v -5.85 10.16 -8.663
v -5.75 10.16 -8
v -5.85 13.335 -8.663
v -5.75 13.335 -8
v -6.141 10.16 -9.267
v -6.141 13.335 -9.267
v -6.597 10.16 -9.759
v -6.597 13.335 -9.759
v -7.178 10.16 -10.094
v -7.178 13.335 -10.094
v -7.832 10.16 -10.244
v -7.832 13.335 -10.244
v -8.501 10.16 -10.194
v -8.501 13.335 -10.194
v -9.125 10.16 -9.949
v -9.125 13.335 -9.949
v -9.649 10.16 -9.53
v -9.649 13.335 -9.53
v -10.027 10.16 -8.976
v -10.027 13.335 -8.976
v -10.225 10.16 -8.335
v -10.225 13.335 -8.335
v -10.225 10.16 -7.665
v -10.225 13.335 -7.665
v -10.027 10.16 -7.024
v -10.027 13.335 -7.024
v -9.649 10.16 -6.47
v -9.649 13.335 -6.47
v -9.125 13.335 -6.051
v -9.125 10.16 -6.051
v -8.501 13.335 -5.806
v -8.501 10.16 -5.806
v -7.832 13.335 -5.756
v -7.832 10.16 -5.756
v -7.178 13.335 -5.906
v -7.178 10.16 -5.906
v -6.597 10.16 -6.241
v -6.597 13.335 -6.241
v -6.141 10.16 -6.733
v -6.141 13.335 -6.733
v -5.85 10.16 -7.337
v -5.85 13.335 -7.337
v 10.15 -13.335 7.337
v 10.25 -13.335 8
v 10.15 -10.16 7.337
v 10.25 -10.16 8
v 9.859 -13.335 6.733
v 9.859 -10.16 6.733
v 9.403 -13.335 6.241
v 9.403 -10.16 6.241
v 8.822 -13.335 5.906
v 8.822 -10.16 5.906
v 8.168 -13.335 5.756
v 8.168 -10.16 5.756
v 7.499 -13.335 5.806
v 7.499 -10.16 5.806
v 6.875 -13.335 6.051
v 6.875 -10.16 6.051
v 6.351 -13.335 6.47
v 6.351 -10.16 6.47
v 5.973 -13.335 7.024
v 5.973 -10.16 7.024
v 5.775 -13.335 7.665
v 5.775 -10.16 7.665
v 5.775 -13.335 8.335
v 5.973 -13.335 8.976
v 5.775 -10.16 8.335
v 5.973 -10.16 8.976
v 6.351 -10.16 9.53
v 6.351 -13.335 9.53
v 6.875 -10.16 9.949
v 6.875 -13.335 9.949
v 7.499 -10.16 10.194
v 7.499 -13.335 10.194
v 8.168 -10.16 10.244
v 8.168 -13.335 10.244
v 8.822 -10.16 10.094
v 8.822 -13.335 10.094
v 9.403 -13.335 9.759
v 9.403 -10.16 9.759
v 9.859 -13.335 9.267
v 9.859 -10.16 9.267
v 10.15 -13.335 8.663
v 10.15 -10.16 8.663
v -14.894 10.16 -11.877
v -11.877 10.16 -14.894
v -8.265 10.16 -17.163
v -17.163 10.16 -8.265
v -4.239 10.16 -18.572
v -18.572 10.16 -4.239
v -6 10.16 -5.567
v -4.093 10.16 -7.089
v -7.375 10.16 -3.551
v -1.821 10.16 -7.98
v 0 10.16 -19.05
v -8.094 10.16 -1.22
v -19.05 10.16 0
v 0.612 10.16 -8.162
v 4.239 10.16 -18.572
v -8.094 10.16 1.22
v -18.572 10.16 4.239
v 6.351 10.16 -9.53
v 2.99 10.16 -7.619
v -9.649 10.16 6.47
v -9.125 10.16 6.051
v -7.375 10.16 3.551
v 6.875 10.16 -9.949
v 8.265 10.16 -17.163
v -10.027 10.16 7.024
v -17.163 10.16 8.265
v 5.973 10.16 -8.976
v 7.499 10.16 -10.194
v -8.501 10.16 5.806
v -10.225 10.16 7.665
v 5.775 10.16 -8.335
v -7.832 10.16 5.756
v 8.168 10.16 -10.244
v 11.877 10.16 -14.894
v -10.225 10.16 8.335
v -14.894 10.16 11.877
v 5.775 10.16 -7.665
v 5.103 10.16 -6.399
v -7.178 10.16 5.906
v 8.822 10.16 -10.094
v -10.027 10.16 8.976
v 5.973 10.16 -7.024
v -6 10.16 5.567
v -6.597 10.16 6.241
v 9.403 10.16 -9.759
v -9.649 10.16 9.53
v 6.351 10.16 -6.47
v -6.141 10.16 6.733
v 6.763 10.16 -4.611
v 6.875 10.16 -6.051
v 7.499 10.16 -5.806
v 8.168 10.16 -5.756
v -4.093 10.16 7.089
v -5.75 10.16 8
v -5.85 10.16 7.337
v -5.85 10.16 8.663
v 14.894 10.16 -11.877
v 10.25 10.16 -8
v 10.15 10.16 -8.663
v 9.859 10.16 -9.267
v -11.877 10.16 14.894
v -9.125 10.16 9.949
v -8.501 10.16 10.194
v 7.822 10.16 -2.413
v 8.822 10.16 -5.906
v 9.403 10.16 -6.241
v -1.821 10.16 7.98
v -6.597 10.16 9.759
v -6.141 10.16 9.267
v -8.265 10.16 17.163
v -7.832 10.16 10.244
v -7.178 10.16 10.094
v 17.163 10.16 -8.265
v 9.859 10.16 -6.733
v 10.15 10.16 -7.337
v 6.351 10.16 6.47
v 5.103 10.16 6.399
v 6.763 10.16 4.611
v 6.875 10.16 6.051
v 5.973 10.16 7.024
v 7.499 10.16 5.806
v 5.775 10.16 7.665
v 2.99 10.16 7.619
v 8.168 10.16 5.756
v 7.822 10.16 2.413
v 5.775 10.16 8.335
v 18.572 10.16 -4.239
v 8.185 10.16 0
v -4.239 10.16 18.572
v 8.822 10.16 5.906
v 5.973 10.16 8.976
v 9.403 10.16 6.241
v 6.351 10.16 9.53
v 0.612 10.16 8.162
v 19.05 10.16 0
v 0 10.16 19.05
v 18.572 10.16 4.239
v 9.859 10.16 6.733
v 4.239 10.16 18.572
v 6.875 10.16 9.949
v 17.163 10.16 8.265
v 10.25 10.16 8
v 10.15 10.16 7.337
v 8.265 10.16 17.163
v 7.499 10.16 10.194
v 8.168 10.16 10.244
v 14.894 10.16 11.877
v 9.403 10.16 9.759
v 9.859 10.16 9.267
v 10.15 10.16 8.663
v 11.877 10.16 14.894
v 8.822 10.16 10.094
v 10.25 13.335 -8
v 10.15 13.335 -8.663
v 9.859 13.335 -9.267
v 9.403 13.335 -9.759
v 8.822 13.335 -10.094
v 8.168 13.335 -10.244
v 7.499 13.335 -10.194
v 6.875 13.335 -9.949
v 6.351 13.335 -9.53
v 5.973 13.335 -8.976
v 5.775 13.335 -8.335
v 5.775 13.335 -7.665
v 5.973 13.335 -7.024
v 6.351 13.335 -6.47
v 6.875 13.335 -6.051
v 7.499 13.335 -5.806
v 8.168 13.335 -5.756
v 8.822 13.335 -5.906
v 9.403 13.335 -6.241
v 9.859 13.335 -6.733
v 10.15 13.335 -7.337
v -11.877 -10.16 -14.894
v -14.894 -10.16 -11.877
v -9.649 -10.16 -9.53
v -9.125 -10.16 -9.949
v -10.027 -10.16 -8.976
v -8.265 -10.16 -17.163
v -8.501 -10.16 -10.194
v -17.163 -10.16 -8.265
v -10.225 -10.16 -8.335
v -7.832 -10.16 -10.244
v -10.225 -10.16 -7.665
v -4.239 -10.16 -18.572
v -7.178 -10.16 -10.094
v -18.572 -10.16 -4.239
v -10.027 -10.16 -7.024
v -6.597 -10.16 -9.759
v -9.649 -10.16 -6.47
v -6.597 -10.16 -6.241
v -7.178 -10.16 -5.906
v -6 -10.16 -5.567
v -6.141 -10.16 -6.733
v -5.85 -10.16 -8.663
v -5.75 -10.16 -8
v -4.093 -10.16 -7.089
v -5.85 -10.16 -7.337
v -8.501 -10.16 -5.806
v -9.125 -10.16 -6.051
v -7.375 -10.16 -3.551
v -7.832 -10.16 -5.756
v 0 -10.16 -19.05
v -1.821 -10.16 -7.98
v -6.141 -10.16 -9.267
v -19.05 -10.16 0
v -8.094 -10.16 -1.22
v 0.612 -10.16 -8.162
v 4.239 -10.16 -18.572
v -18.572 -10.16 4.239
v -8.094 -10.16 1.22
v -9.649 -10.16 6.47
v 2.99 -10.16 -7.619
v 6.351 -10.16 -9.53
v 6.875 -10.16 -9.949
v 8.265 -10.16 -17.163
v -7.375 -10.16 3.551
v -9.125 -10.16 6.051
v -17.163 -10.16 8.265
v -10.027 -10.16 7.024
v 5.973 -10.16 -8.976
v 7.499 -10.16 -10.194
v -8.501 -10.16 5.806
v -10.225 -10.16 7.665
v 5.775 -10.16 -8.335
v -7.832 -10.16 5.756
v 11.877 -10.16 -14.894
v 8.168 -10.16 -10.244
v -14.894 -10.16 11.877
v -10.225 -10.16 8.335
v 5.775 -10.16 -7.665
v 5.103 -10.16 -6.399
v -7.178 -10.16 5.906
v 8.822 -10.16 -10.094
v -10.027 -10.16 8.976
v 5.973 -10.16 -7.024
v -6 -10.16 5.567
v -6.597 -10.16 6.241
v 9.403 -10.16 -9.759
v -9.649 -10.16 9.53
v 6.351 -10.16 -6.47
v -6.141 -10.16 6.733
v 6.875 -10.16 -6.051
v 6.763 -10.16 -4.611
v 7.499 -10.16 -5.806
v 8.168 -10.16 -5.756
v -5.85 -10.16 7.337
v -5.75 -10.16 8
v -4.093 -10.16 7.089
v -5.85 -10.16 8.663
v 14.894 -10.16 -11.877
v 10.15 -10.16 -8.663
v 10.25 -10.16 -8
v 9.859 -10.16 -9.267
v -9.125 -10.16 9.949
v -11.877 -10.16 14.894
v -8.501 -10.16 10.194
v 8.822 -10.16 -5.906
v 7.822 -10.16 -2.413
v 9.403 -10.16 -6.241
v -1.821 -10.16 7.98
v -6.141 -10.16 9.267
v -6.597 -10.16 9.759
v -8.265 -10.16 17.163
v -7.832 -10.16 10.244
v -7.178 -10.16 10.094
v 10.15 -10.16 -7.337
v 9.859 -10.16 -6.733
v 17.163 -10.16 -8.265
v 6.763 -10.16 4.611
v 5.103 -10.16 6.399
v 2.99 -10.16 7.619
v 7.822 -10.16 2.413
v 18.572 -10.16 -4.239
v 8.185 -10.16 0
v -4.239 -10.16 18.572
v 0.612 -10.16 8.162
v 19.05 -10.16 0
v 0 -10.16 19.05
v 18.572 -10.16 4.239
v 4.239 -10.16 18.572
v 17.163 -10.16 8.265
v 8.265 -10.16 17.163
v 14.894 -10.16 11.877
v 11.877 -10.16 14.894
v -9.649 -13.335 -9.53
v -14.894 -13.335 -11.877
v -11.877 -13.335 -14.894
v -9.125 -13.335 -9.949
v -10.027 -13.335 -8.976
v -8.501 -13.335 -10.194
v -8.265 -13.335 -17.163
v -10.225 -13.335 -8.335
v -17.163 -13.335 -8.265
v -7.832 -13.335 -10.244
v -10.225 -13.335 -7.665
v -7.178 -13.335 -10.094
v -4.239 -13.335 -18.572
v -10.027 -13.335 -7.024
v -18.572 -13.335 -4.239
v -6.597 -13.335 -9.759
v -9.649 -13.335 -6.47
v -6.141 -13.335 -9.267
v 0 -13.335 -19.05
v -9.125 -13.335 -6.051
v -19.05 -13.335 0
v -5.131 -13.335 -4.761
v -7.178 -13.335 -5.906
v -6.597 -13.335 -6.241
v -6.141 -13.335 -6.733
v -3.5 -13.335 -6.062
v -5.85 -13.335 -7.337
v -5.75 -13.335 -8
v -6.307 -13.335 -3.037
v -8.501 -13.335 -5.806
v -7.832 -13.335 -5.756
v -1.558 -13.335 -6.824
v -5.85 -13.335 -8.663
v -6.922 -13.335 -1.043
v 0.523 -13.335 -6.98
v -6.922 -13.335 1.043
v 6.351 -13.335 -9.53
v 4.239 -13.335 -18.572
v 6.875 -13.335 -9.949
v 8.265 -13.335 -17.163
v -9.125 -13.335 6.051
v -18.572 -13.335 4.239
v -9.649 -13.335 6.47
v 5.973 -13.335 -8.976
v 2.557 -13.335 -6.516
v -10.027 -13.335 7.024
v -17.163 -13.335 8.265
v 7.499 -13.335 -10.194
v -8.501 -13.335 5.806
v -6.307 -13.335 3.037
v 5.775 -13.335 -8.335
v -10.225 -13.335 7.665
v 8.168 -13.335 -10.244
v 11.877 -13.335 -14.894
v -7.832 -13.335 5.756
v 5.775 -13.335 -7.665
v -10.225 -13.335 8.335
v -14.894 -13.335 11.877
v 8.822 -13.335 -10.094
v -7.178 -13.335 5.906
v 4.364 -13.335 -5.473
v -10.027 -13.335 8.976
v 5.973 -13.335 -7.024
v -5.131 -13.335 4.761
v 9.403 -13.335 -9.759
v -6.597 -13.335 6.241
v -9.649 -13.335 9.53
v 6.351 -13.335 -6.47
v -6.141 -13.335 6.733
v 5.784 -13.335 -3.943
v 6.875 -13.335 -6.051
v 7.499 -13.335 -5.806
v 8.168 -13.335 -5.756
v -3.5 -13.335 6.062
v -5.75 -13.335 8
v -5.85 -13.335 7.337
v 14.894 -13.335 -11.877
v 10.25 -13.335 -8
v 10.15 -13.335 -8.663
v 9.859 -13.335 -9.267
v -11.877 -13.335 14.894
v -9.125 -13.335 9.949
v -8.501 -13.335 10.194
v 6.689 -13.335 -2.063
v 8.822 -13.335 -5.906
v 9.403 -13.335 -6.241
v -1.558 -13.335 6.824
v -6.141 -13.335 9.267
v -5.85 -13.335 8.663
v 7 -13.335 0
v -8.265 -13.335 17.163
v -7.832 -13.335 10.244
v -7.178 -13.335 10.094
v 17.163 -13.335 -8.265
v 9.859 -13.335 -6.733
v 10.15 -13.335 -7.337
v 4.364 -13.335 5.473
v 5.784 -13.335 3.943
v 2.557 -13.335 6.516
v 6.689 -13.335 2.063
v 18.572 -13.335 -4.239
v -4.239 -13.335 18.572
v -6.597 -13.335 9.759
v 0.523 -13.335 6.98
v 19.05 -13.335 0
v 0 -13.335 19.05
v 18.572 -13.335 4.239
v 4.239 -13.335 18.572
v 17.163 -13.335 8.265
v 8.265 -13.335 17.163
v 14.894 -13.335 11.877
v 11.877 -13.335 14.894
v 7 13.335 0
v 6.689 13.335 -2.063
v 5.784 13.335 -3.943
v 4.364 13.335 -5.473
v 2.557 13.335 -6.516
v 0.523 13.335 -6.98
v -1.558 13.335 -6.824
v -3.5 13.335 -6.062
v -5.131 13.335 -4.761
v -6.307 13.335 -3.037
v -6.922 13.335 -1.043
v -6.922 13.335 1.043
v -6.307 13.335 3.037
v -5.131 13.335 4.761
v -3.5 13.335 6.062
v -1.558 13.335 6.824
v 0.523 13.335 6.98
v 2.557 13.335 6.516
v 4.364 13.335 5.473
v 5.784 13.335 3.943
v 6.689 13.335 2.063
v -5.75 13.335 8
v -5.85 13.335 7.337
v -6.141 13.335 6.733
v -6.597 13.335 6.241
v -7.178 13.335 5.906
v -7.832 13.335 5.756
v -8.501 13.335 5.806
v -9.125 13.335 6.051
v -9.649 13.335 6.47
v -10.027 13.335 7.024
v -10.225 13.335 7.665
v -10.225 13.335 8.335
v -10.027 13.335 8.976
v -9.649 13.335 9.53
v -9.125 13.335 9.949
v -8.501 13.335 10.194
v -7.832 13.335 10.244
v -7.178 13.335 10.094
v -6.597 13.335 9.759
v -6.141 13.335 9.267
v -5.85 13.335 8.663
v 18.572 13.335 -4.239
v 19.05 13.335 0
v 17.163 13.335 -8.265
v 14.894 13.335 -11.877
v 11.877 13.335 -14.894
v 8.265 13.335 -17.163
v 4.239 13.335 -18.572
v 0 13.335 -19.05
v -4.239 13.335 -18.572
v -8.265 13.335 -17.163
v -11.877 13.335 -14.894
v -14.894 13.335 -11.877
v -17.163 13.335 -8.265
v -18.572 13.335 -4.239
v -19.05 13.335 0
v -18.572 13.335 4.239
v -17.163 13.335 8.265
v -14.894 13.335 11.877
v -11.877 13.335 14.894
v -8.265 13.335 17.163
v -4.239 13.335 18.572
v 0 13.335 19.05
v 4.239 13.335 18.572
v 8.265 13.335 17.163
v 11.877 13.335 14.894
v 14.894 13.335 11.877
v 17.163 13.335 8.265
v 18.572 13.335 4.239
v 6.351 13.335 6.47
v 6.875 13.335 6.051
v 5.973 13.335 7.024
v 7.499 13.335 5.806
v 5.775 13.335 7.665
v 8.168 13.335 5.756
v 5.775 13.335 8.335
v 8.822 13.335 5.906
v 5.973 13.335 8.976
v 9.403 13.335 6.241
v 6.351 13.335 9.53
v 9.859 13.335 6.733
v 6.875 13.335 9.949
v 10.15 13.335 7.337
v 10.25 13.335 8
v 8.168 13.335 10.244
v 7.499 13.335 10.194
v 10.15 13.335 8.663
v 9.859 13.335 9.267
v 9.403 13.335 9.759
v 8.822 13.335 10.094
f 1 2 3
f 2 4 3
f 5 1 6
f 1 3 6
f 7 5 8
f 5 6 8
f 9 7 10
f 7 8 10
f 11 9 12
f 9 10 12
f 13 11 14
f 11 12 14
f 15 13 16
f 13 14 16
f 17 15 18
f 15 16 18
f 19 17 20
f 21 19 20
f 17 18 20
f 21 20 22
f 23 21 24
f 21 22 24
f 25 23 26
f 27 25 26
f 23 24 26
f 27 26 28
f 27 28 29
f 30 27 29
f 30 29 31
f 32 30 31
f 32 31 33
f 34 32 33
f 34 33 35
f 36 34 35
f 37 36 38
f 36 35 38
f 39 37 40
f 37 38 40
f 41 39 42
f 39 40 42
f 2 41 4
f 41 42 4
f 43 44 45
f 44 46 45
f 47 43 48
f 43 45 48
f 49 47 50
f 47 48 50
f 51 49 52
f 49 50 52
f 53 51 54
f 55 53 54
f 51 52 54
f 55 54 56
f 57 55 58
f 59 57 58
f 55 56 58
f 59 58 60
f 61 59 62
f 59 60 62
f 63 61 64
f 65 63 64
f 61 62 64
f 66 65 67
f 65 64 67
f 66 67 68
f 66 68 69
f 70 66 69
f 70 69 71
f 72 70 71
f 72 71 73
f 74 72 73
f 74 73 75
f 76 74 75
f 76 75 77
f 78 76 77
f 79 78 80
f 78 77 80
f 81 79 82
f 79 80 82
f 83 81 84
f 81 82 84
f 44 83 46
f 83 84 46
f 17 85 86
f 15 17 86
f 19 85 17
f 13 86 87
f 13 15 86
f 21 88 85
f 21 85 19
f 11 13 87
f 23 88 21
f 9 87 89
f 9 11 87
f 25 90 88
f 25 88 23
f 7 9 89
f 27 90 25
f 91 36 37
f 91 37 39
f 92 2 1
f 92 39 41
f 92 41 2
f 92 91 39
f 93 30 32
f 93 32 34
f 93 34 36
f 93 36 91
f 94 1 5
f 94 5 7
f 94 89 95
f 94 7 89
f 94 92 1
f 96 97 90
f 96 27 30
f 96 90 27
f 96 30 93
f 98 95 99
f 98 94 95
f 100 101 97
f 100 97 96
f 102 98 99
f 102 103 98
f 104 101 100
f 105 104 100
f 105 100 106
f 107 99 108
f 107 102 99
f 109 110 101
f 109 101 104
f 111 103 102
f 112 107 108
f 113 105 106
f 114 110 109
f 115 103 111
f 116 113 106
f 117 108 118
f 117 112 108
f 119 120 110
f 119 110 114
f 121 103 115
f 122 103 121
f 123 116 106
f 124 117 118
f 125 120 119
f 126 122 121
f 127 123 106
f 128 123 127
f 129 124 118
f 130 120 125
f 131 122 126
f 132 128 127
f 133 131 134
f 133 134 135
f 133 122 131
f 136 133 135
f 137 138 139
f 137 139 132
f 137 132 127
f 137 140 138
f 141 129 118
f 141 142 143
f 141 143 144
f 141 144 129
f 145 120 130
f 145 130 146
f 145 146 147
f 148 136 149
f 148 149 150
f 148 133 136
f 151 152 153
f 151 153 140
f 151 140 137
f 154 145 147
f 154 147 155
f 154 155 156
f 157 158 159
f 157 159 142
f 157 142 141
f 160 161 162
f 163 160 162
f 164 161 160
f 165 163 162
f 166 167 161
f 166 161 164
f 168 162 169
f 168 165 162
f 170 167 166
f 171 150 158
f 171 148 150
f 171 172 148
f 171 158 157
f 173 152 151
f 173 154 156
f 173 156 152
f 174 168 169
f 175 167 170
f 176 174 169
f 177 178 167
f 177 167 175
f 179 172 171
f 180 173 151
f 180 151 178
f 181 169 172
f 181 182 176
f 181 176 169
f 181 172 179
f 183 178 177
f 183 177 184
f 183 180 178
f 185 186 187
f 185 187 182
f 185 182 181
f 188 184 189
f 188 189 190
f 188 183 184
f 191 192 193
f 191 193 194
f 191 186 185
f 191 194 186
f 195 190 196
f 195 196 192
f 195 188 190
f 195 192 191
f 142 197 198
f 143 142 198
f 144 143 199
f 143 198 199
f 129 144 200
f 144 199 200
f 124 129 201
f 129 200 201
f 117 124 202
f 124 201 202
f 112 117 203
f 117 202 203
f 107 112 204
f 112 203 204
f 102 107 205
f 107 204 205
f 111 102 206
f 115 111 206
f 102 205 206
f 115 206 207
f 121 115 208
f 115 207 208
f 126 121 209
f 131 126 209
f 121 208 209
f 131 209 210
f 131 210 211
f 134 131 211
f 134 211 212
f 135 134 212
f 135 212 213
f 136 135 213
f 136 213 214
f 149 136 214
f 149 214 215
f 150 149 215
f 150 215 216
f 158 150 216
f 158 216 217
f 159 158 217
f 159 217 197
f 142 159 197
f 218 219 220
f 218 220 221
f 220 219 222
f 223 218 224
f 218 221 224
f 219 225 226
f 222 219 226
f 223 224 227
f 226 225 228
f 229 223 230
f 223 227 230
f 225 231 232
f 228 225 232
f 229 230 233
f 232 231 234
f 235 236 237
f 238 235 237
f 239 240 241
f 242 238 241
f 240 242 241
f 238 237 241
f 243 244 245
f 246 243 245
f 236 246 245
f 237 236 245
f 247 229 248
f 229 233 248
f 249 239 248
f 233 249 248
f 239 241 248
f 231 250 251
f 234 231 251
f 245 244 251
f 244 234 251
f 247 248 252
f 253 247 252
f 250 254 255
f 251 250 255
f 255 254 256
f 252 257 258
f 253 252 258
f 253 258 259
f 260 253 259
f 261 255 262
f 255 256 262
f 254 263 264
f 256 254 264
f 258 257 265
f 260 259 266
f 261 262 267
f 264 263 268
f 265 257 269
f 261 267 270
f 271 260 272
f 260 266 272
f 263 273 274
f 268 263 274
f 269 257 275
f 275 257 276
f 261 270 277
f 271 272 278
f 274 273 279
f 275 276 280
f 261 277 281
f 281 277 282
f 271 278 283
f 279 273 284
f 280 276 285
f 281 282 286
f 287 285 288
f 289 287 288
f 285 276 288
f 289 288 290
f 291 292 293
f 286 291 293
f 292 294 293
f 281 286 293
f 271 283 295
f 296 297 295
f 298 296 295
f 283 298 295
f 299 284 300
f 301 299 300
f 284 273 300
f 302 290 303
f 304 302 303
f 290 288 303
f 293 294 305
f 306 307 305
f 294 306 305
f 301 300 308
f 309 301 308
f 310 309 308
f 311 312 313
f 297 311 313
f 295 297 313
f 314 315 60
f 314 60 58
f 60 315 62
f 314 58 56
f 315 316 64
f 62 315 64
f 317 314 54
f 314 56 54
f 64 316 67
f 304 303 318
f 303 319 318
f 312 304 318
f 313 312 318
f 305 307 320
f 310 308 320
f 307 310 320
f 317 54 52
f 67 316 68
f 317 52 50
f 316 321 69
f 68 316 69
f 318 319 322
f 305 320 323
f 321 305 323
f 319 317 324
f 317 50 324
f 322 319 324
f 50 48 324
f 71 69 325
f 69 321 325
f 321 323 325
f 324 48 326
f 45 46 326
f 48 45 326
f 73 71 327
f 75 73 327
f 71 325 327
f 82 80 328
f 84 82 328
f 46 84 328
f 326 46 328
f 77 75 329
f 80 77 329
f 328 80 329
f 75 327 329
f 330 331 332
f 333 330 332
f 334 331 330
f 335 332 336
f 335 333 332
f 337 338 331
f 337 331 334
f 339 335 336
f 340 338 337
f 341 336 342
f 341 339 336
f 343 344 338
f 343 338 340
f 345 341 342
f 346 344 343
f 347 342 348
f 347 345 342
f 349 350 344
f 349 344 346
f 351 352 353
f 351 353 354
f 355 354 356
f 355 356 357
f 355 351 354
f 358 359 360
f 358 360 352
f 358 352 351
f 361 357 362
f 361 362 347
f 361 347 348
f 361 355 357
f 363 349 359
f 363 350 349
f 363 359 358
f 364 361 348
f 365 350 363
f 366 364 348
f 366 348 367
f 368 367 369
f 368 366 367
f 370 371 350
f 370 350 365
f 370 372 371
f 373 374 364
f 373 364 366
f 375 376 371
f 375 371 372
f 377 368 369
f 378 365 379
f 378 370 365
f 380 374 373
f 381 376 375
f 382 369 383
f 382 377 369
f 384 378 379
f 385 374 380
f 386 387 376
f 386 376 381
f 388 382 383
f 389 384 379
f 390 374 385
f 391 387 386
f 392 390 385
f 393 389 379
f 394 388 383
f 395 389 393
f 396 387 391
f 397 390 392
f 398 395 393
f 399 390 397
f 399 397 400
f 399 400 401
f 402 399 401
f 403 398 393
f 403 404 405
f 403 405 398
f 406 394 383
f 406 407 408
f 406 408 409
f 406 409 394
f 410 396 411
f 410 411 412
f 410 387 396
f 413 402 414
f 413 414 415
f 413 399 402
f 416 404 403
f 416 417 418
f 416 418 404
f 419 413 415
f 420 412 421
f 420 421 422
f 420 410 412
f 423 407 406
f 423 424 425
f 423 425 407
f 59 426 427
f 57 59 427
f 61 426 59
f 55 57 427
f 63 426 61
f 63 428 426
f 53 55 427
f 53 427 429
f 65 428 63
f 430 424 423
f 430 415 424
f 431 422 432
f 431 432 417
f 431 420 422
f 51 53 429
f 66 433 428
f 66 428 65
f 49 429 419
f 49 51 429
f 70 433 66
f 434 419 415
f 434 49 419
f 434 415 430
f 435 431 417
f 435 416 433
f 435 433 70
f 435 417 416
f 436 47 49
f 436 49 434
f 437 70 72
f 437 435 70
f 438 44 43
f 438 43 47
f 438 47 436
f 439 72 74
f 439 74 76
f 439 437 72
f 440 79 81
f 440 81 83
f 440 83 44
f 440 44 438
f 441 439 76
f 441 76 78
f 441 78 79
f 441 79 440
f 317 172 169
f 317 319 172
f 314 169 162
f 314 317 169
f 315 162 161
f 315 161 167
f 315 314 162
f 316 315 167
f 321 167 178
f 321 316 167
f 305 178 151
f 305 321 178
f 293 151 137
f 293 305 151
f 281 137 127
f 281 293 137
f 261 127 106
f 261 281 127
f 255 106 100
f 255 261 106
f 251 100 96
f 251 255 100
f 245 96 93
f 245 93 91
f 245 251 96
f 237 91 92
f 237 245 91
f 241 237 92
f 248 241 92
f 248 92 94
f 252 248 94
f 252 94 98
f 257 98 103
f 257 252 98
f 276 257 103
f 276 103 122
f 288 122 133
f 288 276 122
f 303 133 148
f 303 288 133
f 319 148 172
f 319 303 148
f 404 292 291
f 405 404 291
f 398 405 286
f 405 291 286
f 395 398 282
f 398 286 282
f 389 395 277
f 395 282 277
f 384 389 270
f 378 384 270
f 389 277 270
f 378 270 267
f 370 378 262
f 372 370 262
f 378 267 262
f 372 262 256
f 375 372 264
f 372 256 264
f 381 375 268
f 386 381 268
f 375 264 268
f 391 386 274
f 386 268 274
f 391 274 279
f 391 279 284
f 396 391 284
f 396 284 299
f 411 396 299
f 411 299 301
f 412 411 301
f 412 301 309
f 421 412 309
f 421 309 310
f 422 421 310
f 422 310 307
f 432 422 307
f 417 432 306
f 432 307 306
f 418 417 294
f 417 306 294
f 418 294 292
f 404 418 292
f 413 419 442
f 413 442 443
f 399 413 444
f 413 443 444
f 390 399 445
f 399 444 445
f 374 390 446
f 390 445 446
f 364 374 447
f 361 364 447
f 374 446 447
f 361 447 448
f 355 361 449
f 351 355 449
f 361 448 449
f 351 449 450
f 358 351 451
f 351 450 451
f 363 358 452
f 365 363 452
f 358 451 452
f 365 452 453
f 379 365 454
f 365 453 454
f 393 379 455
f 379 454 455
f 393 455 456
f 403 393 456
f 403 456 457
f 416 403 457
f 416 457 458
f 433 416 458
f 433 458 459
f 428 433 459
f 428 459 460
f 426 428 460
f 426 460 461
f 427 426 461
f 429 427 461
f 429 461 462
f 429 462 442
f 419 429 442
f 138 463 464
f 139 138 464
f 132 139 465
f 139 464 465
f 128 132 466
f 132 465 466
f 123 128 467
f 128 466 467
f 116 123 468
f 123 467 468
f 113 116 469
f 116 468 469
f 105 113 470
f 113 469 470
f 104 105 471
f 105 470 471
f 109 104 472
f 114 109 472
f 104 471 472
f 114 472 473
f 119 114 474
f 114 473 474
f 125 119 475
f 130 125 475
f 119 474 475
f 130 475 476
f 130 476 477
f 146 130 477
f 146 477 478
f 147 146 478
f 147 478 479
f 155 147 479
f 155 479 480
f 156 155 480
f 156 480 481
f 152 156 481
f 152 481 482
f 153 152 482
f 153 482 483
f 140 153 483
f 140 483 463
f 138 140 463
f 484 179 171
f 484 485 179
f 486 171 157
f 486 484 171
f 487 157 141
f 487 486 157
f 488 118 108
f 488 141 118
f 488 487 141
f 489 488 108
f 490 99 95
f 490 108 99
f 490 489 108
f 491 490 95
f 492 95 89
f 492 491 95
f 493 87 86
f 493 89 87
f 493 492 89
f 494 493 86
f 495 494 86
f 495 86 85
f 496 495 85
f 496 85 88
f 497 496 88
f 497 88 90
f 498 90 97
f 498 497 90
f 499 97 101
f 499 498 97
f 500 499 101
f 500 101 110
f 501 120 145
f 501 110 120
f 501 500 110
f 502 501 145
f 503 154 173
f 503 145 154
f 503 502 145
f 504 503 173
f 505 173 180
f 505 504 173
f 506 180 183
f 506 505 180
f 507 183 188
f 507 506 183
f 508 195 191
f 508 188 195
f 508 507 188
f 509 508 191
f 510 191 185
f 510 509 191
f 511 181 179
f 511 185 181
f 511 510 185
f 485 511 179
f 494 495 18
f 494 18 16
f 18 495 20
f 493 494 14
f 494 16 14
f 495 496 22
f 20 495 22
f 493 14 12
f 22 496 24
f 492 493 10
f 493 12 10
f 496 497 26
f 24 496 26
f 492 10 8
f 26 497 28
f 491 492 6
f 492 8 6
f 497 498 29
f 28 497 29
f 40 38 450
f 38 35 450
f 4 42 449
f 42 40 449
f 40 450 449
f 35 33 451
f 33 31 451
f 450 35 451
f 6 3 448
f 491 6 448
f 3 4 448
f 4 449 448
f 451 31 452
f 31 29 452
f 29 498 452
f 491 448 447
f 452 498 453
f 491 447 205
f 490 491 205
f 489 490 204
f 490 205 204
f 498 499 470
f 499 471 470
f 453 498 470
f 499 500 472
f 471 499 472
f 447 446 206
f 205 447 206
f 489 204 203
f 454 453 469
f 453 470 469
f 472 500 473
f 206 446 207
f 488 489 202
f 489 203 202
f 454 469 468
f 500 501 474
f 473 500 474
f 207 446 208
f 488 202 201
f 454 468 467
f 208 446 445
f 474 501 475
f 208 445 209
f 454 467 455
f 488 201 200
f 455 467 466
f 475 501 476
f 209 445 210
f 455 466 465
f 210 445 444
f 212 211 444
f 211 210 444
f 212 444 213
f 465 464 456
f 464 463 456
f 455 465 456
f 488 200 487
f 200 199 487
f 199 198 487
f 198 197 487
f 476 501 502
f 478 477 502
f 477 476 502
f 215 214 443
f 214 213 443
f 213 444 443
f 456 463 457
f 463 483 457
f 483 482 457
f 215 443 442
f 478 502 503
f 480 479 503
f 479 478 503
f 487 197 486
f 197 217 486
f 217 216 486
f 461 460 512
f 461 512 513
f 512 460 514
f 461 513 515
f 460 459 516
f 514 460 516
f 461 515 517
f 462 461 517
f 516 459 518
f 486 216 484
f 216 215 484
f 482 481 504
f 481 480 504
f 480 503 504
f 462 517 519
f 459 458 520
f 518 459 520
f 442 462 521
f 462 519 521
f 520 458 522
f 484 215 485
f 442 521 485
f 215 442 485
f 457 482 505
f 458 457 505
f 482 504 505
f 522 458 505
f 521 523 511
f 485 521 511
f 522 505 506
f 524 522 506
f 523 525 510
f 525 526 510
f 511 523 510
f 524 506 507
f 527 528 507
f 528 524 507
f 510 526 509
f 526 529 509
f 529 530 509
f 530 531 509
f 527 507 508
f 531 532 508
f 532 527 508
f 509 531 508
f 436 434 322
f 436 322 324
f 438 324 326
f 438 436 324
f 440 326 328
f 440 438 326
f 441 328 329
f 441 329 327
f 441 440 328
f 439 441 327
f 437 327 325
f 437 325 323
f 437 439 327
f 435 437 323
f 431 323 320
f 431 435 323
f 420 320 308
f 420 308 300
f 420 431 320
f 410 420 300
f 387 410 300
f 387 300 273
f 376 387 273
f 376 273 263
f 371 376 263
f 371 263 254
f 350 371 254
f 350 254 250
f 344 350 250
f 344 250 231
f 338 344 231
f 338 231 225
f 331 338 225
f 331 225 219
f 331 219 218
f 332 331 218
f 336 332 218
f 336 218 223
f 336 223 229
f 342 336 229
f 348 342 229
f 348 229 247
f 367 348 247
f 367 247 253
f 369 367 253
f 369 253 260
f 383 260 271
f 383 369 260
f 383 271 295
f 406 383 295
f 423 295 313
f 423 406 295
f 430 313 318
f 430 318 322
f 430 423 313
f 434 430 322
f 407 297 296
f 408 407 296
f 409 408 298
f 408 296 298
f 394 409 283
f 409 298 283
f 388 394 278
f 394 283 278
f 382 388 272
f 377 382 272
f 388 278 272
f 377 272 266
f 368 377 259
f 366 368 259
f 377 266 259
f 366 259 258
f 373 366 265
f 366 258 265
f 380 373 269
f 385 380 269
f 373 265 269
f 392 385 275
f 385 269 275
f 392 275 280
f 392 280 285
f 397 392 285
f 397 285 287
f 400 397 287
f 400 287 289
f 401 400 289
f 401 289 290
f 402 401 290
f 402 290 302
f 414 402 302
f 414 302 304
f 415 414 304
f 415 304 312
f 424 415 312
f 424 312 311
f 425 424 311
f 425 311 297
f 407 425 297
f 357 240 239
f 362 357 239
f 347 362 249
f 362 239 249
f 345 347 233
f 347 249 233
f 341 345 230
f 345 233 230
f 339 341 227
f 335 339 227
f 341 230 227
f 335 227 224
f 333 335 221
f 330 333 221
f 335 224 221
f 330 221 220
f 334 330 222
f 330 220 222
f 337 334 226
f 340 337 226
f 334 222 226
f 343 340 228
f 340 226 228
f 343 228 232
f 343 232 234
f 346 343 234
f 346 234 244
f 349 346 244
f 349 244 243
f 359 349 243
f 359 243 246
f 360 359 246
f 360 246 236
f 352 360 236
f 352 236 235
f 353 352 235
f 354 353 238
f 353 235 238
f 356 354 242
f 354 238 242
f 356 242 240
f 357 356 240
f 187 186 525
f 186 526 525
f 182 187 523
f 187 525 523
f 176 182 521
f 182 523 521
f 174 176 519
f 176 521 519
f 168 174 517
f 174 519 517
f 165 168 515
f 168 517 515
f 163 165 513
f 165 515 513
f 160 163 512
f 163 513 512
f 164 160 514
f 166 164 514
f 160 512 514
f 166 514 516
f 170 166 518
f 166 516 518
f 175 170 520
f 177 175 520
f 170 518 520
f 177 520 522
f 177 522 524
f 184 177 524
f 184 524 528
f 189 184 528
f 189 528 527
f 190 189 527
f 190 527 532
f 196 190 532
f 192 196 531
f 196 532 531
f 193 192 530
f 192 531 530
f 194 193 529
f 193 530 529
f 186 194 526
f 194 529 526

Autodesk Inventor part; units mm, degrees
ref_plane "YZ Plane" through (0, 0, 0) normal (1, 0, 0) x (0, 1, 0)
ref_plane "XZ Plane" through (0, 0, 0) normal (0, 1, 0) x (-1, 0, 0)
ref_plane "XY Plane" through (0, 0, 0) normal (0, 0, 1) x (1, 0, 0)
sketch "Sketch1" plane through (0, 0, 0) normal (0, 0, 1) x (1, 0, 0)
  line L0 (-5, -10.16) -> (5, -10.16)
  line L1 (5, -10.16) -> (5, 10.16)
  line L2 (5, 10.16) -> (-5, 10.16)
  line L3 (-5, 10.16) -> (-5, -10.16)
  line L4 (-5, -10.16) -> (5, 10.16) construction
  line L5 (5, -10.16) -> (-5, 10.16) construction
  line L6 (5, 10.16) -> (8.1852, 10.16)
  line L7 (8.1852, 10.16) -> (8.1852, -10.16)
  line L8 (8.1852, -10.16) -> (5, -10.16)
  line L9 (5, -10.16) -> (5, 10.16)
  line L10 (0, 10.16) -> (0, -10.16)
  line L11 (0, 10.16) -> (19.05, 10.16)
  line L12 (19.05, 10.16) -> (19.05, 13.335)
  line L13 (19.05, 13.335) -> (0, 13.335)
  line L14 (0, 13.335) -> (0, 10.16)
  line L15 (0, -10.16) -> (19.05, -10.16)
  line L16 (19.05, -10.16) -> (19.05, -13.335)
  line L17 (19.05, -13.335) -> (0, -13.335)
  line L18 (0, -13.335) -> (0, -10.16)
  point P0 (0, 0)
  point P1 (8.1852, -10.16)
  dimension "d0" = 10
  dimension "d1" = 20.32
  dimension "d2" = 3.1852
  dimension "d3" = 19.05
  dimension "d4" = 3.175
  dimension "d5" = 19.05
  dimension "d6" = 3.175
revolve "Revolution1" add sketch "Sketch1" angle 360 about axis through (0, 10.16, 0) along (0, -1, 0) contours L0 L8 L15 L16 L17 L18 | L1 L6 L7 L8 | L14 L13 L12 L11 L6 L2
sketch "Sketch2" plane through (0, 13.335, 0) normal (0, 1, 0) x (1, 0, 0)
  circle A0 centre (0, 0) radius 7
  line L0 (8, -8) -> (-8, -8)
  line L1 (-8, -8) -> (-8, 8)
  line L2 (-8, 8) -> (8, 8)
  line L3 (8, 8) -> (8, -8)
  line L4 (8, -8) -> (-8, 8) construction
  line L5 (-8, -8) -> (8, 8) construction
  circle A1 centre (-8, 8) radius 2.25
  circle A2 centre (8, 8) radius 2.25
  circle A3 centre (8, -8) radius 2.25
  circle A4 centre (-8, -8) radius 2.25
  dimension "d8" = 14
  dimension "d11" = 16
  dimension "d12" = 16
  dimension "d13" = 4.5
  dimension "d14" = 4.5
  dimension "d15" = 4.5
  dimension "d16" = 4.5
extrude "Extrusion1" cut sketch "Sketch2" against normal through all contours A0 | A4 L1 L0 | L0 L1 A4 | A3 L3 L0 | L0 L3 A3 | A1 L2 L1 | L1 L2 A1 | A2 L2 L3 | L3 L2 A2
properties part number "Slide_Climb_Spool"
